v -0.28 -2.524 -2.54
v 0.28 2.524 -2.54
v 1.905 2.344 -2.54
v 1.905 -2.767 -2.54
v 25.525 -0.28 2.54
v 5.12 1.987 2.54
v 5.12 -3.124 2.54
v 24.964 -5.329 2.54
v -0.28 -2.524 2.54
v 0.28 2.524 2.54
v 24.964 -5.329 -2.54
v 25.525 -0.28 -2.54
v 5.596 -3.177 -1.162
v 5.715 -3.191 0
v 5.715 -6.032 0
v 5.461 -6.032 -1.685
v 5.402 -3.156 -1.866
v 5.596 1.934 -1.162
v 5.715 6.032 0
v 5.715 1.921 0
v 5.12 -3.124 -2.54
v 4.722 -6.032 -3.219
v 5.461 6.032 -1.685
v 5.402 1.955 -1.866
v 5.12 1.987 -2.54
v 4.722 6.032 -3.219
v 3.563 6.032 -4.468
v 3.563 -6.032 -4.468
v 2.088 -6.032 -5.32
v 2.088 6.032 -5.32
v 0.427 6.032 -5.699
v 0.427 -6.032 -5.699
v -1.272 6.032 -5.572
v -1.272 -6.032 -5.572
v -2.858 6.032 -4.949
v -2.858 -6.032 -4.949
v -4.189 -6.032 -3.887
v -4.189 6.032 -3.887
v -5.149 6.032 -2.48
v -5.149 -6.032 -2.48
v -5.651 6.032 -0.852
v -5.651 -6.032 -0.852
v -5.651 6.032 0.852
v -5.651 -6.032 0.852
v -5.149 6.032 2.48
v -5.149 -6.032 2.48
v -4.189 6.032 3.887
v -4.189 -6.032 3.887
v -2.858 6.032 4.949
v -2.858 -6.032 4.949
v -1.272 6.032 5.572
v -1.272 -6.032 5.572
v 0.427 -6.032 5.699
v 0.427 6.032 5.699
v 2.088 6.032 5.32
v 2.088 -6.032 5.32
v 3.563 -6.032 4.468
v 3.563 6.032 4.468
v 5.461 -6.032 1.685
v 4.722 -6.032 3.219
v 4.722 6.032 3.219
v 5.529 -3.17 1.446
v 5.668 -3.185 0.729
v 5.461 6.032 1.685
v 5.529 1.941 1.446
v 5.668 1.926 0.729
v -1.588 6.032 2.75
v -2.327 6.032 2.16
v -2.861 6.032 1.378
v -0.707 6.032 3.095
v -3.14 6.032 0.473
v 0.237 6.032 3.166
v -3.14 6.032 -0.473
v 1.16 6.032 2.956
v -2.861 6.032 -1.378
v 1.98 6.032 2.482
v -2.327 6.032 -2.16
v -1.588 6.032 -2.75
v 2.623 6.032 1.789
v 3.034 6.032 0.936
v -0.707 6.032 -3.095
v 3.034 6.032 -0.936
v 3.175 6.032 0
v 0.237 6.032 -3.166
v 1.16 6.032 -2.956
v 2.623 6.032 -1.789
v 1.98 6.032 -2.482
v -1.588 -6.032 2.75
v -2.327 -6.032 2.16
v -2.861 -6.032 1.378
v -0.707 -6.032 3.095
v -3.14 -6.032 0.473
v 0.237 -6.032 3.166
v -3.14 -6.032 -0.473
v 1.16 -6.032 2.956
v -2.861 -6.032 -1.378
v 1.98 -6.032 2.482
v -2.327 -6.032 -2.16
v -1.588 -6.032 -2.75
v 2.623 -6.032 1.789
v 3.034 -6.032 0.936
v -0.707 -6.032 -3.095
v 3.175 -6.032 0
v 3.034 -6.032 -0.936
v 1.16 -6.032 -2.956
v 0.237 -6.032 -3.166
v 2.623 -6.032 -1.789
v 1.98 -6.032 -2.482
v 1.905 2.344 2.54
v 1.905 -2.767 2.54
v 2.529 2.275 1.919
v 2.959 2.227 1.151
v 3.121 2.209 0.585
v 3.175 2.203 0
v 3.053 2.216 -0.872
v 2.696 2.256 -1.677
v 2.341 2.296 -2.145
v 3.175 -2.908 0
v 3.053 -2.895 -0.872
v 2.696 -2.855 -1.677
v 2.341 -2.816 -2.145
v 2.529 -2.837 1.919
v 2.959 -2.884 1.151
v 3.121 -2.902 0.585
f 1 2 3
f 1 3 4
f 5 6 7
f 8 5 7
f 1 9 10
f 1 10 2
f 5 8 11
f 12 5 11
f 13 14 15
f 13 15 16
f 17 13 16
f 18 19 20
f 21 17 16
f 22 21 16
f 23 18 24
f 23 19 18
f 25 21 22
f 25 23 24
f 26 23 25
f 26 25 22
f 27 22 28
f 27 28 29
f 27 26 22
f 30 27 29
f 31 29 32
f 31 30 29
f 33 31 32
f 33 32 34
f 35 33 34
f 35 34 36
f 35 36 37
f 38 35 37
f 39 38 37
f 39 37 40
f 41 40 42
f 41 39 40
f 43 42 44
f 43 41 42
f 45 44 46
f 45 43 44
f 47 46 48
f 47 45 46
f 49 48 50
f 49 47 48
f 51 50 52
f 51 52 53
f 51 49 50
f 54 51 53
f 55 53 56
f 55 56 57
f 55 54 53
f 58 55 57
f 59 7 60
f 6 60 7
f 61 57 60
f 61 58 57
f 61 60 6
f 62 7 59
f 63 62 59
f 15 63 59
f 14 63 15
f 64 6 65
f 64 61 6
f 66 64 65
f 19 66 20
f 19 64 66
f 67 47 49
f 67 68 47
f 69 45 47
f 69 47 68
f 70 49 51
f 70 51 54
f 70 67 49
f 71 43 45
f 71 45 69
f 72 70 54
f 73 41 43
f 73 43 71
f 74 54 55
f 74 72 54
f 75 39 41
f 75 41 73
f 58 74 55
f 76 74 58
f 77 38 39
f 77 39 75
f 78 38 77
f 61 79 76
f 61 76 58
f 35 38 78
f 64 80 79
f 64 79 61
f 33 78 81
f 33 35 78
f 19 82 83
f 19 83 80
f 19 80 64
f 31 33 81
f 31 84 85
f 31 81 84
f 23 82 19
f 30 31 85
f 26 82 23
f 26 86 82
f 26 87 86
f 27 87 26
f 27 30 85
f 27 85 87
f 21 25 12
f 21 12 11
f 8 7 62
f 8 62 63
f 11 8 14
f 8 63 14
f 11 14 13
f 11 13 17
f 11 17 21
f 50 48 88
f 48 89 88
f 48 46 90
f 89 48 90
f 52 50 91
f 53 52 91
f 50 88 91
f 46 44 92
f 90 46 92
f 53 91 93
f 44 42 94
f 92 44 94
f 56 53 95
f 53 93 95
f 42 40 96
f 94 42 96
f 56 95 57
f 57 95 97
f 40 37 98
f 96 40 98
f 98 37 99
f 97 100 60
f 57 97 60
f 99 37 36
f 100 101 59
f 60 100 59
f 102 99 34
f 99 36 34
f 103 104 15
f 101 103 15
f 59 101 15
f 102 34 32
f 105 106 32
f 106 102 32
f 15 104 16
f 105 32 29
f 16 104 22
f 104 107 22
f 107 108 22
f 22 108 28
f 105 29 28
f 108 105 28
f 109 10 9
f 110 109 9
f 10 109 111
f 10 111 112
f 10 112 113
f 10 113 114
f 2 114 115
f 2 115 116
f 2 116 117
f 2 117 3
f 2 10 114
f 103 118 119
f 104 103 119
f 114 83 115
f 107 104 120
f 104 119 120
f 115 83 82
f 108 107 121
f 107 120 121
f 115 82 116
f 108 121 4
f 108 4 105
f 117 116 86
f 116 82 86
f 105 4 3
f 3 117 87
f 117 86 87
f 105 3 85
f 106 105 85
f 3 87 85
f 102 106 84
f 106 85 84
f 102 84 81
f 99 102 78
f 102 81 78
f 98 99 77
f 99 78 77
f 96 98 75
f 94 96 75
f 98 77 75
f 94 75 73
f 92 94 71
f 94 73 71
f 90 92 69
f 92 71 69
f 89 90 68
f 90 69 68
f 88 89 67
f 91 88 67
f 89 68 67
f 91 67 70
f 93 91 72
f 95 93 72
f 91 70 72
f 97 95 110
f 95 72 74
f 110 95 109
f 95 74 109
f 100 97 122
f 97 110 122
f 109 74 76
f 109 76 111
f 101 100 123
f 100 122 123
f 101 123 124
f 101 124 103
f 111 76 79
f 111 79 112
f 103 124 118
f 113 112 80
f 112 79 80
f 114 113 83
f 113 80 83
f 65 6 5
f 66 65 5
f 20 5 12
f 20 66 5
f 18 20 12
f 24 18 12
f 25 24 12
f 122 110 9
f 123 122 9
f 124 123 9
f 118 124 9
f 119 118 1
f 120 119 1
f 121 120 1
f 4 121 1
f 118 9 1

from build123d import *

# Parameters (mm, degrees)
SKETCH2_R                = 3.175
CUT_EXTRUDE1_DEPTH       = 6.715
CUT_EXTRUDE1_DEPTH_BACK  = 6.715
SKETCH3_R                = 5.715
SKETCH3_R_2              = 3.175
BOSS_EXTRUDE1_DEPTH      = 6.0325
BOSS_EXTRUDE1_DEPTH_BACK = 6.0325
SKETCH4_W                = 5.08
SKETCH4_H                = 5.08
BOSS_EXTRUDE2_DEPTH      = 25.4


with BuildPart() as part:
    # Sketch1 → Revolve1 (revolve)
    with BuildSketch(Plane.XY):
        with BuildLine():
            Line((0, 5.715), (0, -5.715))
            ThreePointArc((0, -5.715), (5.715, 0), (0, 5.715))
        make_face()
    revolve(axis=Axis((0, 5.715, 0), (0, -1, 0)))

    # Sketch2 → Cut-Extrude1 (cut, two sides)
    with BuildSketch(Plane(origin=(0, 0, 0), x_dir=(1, 0, 0), z_dir=(0, 1, 0))) as cut_extrude1_sk:
        Circle(SKETCH2_R)
    extrude(amount=CUT_EXTRUDE1_DEPTH, mode=Mode.SUBTRACT)
    extrude(cut_extrude1_sk.sketch, amount=-CUT_EXTRUDE1_DEPTH_BACK, mode=Mode.SUBTRACT)

    # Sketch3 → Boss-Extrude1 (add, two sides)
    with BuildSketch(Plane(origin=(0, 0, 0), x_dir=(1, 0, 0), z_dir=(0, 1, 0))) as boss_extrude1_sk:
        Circle(SKETCH3_R)
        Circle(SKETCH3_R_2, mode=Mode.SUBTRACT)
    extrude(amount=BOSS_EXTRUDE1_DEPTH)
    extrude(boss_extrude1_sk.sketch, amount=-BOSS_EXTRUDE1_DEPTH_BACK)

    # Sketch4 → Boss-Extrude2 (add)
    with BuildSketch(Plane(origin=(0, 0, 0), x_dir=(0, 0, -1), z_dir=(-0.993884104, 0.1104282, 0))):
        Rectangle(SKETCH4_W, SKETCH4_H)
    extrude(amount=-BOSS_EXTRUDE2_DEPTH)


solid = part.part
